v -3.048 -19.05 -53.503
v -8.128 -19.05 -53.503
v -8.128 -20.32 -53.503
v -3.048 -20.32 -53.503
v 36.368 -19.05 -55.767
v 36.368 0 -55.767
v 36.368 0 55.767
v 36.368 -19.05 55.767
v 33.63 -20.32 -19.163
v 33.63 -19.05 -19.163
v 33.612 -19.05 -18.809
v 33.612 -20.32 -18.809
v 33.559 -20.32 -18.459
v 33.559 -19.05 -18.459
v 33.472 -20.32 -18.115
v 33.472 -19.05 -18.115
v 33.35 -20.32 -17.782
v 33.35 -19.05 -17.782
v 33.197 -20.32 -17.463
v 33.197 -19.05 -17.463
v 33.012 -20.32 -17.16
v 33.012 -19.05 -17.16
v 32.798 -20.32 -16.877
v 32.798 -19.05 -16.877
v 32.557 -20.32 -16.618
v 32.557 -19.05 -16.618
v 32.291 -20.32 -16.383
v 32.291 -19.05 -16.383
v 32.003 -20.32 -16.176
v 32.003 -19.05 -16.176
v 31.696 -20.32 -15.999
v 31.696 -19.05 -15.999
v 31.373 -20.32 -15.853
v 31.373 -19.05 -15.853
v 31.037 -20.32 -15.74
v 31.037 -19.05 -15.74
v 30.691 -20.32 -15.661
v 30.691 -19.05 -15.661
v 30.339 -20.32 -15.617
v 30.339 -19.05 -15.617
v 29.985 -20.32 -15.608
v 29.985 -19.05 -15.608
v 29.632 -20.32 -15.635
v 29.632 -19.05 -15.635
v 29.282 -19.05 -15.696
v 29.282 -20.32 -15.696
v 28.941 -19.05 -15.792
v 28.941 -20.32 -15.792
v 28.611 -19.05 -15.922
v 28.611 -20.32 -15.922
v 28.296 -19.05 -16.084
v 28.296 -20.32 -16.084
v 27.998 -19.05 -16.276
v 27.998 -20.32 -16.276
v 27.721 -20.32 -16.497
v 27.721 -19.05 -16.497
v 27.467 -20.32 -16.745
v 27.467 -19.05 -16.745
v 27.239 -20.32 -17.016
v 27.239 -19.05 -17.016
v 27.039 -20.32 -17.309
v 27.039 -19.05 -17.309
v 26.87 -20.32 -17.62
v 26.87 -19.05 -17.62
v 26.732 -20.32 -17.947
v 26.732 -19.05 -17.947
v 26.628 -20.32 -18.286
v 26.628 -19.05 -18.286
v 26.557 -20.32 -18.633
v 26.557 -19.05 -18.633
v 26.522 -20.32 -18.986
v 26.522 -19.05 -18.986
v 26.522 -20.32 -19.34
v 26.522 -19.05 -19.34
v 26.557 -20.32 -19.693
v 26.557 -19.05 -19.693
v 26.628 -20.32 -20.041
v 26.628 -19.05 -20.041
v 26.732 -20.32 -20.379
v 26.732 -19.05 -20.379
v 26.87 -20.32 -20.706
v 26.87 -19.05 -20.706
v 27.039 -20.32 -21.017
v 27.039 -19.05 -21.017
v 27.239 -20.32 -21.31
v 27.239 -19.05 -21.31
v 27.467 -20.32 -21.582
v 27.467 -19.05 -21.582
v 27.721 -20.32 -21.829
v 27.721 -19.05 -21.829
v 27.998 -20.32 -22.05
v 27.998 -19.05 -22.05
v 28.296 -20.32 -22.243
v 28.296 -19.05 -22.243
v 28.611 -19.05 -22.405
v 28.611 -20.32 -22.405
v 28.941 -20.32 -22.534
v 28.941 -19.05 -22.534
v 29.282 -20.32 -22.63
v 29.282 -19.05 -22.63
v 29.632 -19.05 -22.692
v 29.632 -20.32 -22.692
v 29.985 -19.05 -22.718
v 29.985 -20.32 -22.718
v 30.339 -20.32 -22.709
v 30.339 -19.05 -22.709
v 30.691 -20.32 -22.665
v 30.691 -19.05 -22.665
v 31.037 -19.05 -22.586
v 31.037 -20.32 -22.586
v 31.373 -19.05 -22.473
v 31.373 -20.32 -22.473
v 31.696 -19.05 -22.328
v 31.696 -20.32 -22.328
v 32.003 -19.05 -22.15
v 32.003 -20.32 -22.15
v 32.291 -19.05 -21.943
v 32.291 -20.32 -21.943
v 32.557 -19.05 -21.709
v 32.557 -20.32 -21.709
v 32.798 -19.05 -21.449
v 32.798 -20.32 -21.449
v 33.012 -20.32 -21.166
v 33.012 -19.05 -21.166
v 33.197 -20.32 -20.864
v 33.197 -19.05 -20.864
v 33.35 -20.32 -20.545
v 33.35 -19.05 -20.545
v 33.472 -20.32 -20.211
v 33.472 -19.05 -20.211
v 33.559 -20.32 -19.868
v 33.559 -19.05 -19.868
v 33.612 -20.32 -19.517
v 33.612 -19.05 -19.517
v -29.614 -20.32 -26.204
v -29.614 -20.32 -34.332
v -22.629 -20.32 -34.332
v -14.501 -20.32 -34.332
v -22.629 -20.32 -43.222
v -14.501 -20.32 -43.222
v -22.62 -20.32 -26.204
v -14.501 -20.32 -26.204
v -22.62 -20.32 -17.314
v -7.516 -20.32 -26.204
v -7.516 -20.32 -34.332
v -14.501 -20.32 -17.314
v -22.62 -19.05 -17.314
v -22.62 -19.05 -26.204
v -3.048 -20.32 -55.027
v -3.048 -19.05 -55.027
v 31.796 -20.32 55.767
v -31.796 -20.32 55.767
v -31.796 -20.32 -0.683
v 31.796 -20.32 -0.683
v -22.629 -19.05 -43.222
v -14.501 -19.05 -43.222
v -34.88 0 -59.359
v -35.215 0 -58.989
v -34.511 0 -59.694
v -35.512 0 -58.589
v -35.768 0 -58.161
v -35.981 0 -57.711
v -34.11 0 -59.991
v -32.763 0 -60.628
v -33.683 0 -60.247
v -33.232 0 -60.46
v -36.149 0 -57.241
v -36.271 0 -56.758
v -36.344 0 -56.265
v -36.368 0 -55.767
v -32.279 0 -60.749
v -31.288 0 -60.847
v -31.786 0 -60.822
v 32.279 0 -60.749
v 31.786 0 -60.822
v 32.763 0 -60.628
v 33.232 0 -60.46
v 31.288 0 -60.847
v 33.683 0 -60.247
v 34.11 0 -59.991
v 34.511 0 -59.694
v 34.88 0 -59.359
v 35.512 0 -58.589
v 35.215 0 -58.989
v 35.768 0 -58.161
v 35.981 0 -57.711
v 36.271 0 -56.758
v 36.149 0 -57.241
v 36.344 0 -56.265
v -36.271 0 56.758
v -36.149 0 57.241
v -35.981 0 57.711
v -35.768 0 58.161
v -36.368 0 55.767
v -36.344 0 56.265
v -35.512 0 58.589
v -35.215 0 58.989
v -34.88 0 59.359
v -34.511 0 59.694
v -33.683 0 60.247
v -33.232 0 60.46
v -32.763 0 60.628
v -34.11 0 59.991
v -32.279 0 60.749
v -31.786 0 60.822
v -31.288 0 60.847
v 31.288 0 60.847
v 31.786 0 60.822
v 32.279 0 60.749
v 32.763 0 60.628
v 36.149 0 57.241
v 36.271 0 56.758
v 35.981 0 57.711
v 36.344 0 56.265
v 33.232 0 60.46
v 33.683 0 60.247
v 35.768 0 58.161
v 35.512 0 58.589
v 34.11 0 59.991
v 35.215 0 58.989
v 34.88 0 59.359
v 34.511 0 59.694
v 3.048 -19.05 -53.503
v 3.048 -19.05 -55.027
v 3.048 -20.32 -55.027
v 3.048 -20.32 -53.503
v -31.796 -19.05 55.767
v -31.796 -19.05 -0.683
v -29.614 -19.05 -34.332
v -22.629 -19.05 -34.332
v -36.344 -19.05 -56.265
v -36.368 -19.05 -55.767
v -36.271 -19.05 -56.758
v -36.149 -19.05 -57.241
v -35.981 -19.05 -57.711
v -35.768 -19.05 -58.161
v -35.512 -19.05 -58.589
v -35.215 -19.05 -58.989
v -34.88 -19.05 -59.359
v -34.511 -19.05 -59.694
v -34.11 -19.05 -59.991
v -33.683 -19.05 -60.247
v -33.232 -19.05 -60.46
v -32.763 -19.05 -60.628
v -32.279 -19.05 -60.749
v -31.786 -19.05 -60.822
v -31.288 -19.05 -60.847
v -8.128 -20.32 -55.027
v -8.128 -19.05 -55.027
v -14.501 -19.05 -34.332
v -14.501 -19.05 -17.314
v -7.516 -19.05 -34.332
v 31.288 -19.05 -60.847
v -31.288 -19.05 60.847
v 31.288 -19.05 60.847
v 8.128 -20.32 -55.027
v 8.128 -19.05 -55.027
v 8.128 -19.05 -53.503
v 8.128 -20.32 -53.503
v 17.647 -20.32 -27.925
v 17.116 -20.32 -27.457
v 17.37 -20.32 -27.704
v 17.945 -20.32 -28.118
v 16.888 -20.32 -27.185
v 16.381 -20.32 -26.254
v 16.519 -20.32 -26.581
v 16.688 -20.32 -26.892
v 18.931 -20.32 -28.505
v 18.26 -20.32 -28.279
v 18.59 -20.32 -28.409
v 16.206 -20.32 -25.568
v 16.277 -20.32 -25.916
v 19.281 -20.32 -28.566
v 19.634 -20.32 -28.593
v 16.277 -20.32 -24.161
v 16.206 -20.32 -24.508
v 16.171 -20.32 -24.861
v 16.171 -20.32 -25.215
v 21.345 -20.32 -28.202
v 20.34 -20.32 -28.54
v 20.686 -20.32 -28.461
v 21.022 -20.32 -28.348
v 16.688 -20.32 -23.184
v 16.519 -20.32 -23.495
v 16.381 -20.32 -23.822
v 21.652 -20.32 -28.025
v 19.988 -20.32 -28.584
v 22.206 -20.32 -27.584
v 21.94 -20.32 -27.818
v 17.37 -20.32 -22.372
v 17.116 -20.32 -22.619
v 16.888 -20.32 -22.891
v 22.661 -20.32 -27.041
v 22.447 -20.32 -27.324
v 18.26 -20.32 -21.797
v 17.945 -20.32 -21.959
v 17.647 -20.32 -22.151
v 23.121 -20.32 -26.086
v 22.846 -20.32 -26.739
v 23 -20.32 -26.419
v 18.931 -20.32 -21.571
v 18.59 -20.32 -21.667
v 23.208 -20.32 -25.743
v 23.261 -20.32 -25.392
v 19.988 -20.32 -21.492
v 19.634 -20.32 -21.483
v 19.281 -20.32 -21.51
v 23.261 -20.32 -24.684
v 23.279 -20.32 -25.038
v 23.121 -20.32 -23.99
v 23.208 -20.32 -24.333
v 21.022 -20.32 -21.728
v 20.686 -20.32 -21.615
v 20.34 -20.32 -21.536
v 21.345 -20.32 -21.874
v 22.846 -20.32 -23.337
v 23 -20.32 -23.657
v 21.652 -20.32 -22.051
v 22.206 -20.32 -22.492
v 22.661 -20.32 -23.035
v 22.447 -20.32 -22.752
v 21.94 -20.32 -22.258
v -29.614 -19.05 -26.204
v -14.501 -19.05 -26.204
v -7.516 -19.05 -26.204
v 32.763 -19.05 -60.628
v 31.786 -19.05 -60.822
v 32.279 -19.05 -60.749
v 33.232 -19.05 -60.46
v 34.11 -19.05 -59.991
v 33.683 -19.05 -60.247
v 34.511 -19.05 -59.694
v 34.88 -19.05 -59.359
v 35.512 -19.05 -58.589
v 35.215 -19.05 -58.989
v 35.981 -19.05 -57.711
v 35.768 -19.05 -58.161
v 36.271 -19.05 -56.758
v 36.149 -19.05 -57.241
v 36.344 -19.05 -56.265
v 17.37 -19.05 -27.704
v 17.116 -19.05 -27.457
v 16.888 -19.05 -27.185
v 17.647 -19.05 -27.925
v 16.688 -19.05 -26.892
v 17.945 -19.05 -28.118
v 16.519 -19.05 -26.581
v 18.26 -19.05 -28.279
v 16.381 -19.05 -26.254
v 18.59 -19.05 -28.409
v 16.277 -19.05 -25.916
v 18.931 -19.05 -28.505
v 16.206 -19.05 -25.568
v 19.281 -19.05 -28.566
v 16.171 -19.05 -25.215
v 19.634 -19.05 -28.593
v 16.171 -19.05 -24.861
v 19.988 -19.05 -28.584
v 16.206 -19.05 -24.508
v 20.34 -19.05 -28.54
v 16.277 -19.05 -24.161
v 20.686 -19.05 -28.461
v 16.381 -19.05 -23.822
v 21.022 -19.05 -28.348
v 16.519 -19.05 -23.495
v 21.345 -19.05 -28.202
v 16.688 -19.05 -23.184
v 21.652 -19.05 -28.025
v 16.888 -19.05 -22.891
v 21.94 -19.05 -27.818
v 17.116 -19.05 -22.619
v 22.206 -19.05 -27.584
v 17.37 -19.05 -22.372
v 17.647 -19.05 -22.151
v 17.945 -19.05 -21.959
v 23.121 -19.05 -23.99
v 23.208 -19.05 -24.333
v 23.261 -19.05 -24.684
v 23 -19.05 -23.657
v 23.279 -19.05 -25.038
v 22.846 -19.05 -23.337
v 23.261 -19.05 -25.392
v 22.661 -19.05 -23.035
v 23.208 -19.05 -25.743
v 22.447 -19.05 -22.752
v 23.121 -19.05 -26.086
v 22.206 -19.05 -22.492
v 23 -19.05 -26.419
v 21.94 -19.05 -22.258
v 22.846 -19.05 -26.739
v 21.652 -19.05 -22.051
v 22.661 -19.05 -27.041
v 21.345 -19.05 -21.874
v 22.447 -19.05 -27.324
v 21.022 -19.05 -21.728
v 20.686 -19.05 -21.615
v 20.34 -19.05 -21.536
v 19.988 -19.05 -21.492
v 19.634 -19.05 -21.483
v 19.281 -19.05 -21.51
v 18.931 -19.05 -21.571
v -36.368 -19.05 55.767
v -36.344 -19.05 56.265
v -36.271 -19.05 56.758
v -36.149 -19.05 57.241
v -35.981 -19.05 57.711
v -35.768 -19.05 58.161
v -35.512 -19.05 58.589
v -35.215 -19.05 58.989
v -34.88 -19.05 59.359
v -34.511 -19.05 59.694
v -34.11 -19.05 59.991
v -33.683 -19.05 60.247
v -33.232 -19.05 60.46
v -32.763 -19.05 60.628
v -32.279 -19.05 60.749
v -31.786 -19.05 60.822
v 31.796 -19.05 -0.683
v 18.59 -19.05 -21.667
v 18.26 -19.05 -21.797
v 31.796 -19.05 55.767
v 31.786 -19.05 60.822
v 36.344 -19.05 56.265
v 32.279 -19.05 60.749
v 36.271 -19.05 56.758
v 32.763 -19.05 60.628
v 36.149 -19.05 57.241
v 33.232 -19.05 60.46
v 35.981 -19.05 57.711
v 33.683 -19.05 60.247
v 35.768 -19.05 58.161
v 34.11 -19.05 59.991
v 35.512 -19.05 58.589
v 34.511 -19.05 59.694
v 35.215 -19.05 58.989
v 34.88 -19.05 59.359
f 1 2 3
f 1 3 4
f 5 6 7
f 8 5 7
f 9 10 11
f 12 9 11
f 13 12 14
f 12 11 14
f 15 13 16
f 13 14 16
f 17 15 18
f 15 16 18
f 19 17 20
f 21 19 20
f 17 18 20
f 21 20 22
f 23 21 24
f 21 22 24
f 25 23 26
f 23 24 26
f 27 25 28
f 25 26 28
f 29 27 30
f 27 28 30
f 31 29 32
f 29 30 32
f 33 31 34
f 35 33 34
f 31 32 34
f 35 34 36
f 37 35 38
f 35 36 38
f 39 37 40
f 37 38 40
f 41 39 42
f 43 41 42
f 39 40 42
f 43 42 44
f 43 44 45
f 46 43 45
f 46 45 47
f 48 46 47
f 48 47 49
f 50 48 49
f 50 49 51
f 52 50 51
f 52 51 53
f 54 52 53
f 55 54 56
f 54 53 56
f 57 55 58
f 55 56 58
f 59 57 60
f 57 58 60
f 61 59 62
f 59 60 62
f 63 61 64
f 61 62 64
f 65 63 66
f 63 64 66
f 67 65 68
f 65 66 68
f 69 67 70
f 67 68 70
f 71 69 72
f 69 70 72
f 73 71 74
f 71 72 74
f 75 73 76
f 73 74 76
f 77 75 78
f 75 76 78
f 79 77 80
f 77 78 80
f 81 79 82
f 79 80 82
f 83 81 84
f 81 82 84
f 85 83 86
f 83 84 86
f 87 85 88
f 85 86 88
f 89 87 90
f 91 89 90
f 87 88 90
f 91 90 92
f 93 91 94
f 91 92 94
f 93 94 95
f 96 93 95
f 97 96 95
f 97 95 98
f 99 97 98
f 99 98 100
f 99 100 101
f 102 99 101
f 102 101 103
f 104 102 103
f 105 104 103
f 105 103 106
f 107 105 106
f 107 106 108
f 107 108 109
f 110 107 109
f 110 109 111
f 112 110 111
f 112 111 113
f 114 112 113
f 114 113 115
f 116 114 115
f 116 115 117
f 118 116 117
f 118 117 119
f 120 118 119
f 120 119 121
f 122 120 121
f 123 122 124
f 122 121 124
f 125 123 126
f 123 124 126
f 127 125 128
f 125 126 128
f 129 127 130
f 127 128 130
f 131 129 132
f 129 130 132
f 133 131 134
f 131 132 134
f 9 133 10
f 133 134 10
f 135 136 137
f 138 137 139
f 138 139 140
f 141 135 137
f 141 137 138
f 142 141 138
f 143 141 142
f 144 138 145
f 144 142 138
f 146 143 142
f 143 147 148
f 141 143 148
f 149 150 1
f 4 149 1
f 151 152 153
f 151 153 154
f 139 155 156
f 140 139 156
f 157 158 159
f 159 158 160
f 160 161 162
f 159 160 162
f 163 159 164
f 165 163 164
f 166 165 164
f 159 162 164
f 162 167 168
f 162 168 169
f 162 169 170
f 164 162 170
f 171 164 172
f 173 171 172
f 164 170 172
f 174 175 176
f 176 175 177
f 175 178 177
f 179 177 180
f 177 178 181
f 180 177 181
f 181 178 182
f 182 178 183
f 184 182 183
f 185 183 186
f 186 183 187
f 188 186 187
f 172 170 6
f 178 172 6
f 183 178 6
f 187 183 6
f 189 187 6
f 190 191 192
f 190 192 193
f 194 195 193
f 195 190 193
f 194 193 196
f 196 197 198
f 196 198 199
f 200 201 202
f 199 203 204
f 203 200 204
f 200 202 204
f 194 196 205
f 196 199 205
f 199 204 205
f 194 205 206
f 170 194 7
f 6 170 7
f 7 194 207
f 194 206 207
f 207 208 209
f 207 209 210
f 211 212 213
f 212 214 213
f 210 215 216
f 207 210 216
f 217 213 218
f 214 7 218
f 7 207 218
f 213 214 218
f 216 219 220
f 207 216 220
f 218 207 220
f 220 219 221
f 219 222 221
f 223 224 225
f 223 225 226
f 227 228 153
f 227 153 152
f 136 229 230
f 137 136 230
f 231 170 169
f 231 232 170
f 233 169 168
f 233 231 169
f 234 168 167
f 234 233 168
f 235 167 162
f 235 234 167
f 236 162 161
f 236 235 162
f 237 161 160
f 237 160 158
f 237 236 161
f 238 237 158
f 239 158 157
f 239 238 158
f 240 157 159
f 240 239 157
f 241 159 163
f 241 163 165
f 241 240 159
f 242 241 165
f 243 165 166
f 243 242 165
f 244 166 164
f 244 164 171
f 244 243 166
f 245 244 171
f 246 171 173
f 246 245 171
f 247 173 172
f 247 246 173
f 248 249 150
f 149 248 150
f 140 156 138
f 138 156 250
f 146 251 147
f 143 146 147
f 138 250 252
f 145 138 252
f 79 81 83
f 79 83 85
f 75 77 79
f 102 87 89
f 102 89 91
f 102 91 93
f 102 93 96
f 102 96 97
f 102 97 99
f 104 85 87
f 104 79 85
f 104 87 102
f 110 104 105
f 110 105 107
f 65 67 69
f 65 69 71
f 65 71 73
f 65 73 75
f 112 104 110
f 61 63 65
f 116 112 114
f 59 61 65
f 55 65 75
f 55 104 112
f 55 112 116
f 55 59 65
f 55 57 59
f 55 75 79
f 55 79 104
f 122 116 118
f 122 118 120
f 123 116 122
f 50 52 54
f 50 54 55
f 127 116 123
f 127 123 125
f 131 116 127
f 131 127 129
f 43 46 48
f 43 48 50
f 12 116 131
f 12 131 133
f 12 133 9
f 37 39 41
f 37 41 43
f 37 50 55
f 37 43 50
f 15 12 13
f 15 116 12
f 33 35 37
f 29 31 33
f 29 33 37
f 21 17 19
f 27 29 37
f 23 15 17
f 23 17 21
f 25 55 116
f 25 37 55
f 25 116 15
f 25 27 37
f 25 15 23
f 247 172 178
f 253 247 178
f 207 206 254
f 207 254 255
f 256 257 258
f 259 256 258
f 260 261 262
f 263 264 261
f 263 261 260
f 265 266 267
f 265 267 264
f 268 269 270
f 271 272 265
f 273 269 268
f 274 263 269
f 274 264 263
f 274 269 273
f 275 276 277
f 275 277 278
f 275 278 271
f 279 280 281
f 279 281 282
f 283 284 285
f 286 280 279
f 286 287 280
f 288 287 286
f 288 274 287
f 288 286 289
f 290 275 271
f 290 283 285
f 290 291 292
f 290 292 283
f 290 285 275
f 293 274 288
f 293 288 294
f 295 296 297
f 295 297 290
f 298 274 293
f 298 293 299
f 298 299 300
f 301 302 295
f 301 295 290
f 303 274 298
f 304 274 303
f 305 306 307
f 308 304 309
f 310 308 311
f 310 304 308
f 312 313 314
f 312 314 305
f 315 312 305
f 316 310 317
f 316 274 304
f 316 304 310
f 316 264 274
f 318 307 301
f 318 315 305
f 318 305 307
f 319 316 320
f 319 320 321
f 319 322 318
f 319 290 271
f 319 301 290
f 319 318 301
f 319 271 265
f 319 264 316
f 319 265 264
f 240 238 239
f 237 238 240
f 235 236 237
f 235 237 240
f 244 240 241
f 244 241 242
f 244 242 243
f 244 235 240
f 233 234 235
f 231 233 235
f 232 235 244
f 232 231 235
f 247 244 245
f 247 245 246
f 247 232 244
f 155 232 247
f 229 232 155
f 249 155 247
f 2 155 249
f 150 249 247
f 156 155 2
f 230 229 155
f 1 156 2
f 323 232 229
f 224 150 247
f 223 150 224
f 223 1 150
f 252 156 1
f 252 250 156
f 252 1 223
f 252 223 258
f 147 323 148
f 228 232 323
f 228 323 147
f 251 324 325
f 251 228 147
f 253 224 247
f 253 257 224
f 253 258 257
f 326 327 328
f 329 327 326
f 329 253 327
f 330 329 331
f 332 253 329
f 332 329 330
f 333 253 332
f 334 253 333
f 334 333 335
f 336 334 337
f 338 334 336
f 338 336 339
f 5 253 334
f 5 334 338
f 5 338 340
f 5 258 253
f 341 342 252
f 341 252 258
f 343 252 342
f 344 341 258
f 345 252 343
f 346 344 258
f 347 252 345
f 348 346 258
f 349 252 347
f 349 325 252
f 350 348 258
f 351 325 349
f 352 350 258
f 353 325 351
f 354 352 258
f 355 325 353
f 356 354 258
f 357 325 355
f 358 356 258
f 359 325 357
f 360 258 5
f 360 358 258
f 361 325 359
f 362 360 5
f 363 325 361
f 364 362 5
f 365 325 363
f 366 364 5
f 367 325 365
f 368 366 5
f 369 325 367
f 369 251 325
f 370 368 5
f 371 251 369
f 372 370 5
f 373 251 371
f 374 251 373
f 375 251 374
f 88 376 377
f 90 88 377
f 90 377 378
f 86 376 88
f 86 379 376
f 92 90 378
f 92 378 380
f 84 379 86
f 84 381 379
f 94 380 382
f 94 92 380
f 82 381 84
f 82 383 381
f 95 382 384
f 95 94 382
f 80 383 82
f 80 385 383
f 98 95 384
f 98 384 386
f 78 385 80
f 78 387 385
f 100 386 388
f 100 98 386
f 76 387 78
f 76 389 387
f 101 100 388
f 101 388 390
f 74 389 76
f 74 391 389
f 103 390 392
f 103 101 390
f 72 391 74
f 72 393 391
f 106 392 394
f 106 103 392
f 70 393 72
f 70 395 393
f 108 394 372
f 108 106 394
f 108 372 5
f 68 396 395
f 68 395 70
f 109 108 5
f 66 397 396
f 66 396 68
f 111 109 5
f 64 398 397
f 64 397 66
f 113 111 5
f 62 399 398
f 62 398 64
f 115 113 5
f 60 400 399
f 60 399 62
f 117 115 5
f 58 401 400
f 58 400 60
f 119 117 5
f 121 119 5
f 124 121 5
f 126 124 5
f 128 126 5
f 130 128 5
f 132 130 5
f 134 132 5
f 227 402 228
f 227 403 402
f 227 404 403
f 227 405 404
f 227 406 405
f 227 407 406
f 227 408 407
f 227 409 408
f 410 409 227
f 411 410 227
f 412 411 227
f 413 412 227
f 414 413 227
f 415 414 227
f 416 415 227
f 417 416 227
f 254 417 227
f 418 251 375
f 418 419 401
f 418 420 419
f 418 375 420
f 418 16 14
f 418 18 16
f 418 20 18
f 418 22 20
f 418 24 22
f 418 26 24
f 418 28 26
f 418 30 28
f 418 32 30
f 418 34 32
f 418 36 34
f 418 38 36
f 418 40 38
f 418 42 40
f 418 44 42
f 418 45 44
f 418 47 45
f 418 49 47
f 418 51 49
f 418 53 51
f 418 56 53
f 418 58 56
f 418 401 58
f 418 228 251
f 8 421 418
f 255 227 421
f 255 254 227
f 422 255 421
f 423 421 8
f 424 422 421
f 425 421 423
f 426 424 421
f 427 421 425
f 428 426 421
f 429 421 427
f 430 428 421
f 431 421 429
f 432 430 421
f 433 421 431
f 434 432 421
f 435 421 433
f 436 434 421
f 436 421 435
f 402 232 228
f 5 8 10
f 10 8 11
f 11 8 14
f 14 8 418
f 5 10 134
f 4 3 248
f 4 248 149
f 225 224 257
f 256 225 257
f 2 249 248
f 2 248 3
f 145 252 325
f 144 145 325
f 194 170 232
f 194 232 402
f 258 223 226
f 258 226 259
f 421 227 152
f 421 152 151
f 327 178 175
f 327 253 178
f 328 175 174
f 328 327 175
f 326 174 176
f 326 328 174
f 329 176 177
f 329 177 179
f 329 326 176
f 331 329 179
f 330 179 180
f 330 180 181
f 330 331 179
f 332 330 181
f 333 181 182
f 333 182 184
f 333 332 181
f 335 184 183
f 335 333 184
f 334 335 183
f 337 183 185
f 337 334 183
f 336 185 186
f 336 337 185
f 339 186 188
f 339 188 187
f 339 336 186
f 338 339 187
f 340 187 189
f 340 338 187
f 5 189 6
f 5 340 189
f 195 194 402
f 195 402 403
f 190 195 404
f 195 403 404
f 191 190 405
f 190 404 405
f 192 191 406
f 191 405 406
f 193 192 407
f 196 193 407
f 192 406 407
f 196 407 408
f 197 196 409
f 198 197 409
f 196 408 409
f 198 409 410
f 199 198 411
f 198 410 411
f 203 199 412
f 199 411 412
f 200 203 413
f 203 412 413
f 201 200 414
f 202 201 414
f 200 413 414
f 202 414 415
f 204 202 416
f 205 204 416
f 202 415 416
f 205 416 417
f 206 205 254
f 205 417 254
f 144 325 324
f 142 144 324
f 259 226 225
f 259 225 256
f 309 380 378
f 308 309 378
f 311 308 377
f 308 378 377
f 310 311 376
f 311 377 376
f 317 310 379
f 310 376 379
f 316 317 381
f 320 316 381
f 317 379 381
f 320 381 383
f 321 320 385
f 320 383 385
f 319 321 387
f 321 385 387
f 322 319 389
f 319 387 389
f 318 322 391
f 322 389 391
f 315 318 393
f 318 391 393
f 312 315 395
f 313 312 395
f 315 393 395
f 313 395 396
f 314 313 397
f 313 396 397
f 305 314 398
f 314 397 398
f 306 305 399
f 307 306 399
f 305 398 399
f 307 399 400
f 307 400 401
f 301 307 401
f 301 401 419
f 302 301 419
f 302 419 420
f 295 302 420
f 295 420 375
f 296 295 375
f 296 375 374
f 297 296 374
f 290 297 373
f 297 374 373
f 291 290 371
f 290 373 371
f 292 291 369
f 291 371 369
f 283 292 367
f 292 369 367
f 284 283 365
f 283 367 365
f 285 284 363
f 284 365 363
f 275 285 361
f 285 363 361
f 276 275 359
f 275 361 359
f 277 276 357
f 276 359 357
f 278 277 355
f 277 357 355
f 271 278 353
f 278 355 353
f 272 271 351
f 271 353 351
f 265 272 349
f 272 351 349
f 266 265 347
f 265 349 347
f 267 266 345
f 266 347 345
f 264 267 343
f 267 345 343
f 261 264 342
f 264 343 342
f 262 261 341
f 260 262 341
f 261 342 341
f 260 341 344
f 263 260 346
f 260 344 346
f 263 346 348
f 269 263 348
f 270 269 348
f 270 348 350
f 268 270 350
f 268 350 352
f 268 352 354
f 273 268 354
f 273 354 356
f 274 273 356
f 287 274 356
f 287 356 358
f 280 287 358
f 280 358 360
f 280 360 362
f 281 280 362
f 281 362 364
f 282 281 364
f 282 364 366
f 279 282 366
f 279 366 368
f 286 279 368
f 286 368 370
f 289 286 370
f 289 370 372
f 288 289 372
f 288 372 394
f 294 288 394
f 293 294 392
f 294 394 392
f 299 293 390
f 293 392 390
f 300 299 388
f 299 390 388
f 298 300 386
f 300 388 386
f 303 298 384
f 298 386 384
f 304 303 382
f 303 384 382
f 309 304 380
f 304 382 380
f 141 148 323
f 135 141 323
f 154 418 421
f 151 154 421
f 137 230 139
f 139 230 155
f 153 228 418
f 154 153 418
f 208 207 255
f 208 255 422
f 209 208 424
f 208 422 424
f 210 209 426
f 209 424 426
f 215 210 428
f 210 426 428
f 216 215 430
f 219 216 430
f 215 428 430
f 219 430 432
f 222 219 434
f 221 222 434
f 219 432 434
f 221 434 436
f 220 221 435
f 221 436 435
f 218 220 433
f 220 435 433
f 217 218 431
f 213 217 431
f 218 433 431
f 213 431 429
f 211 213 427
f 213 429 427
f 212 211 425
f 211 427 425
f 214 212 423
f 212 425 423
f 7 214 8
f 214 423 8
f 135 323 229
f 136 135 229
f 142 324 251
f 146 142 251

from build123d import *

# Parameters (mm, degrees)
F0_W     = 72.736366
F0_H     = 121.693536
F1_DEPTH = 19.05
F2_W     = 63.592366
F2_H     = 56.449744
F2_R     = 3.556
F2_W_2   = 5.08
F2_H_2   = 1.524
F3_DEPTH = 1.27
F4_R     = 5.08


with BuildPart() as f1:
    # F0 (on Front) → F1 (new body)
    with BuildSketch(Plane.XZ):
        Rectangle(F0_W, F0_H)
    extrude(amount=F1_DEPTH)

    # F2 (on face) → F3 (join)
    with BuildSketch(Plane.XZ.offset(19.05)):
        with Locations((0, 27.541896)):
            Rectangle(F2_W, F2_H)
        Polygon((-14.500647, -17.314185), (-22.619766, -17.314185), (-22.619766, -26.204185), (-29.613647, -26.204185), (-29.613647, -34.332185), (-22.628647, -34.332185), (-22.628647, -43.222185), (-14.500647, -43.222185), (-14.500647, -34.332185), (-7.515647, -34.332185), (-7.515647, -26.204185), (-14.500647, -26.204185), align=None)
        with Locations((30.073691, -19.163234)):
            Circle(F2_R)
        with Locations((19.722743, -25.038093)):
            Circle(F2_R)
        with Locations((-5.588, -54.265258)):
            Rectangle(F2_W_2, F2_H_2)
        with Locations((5.588, -54.265258)):
            Rectangle(F2_W_2, F2_H_2)
    extrude(amount=F3_DEPTH)

    # F4
    f4_edges = [f1.edges().sort_by_distance(p)[0] for p in [
        (-36.368183, -9.525, 60.846768),
        (36.368183, -9.525, 60.846768),
        (36.368183, -9.525, -60.846768),
        (-36.368183, -9.525, -60.846768),
    ]]
    fillet(f4_edges, radius=F4_R)


solid = f1.part
